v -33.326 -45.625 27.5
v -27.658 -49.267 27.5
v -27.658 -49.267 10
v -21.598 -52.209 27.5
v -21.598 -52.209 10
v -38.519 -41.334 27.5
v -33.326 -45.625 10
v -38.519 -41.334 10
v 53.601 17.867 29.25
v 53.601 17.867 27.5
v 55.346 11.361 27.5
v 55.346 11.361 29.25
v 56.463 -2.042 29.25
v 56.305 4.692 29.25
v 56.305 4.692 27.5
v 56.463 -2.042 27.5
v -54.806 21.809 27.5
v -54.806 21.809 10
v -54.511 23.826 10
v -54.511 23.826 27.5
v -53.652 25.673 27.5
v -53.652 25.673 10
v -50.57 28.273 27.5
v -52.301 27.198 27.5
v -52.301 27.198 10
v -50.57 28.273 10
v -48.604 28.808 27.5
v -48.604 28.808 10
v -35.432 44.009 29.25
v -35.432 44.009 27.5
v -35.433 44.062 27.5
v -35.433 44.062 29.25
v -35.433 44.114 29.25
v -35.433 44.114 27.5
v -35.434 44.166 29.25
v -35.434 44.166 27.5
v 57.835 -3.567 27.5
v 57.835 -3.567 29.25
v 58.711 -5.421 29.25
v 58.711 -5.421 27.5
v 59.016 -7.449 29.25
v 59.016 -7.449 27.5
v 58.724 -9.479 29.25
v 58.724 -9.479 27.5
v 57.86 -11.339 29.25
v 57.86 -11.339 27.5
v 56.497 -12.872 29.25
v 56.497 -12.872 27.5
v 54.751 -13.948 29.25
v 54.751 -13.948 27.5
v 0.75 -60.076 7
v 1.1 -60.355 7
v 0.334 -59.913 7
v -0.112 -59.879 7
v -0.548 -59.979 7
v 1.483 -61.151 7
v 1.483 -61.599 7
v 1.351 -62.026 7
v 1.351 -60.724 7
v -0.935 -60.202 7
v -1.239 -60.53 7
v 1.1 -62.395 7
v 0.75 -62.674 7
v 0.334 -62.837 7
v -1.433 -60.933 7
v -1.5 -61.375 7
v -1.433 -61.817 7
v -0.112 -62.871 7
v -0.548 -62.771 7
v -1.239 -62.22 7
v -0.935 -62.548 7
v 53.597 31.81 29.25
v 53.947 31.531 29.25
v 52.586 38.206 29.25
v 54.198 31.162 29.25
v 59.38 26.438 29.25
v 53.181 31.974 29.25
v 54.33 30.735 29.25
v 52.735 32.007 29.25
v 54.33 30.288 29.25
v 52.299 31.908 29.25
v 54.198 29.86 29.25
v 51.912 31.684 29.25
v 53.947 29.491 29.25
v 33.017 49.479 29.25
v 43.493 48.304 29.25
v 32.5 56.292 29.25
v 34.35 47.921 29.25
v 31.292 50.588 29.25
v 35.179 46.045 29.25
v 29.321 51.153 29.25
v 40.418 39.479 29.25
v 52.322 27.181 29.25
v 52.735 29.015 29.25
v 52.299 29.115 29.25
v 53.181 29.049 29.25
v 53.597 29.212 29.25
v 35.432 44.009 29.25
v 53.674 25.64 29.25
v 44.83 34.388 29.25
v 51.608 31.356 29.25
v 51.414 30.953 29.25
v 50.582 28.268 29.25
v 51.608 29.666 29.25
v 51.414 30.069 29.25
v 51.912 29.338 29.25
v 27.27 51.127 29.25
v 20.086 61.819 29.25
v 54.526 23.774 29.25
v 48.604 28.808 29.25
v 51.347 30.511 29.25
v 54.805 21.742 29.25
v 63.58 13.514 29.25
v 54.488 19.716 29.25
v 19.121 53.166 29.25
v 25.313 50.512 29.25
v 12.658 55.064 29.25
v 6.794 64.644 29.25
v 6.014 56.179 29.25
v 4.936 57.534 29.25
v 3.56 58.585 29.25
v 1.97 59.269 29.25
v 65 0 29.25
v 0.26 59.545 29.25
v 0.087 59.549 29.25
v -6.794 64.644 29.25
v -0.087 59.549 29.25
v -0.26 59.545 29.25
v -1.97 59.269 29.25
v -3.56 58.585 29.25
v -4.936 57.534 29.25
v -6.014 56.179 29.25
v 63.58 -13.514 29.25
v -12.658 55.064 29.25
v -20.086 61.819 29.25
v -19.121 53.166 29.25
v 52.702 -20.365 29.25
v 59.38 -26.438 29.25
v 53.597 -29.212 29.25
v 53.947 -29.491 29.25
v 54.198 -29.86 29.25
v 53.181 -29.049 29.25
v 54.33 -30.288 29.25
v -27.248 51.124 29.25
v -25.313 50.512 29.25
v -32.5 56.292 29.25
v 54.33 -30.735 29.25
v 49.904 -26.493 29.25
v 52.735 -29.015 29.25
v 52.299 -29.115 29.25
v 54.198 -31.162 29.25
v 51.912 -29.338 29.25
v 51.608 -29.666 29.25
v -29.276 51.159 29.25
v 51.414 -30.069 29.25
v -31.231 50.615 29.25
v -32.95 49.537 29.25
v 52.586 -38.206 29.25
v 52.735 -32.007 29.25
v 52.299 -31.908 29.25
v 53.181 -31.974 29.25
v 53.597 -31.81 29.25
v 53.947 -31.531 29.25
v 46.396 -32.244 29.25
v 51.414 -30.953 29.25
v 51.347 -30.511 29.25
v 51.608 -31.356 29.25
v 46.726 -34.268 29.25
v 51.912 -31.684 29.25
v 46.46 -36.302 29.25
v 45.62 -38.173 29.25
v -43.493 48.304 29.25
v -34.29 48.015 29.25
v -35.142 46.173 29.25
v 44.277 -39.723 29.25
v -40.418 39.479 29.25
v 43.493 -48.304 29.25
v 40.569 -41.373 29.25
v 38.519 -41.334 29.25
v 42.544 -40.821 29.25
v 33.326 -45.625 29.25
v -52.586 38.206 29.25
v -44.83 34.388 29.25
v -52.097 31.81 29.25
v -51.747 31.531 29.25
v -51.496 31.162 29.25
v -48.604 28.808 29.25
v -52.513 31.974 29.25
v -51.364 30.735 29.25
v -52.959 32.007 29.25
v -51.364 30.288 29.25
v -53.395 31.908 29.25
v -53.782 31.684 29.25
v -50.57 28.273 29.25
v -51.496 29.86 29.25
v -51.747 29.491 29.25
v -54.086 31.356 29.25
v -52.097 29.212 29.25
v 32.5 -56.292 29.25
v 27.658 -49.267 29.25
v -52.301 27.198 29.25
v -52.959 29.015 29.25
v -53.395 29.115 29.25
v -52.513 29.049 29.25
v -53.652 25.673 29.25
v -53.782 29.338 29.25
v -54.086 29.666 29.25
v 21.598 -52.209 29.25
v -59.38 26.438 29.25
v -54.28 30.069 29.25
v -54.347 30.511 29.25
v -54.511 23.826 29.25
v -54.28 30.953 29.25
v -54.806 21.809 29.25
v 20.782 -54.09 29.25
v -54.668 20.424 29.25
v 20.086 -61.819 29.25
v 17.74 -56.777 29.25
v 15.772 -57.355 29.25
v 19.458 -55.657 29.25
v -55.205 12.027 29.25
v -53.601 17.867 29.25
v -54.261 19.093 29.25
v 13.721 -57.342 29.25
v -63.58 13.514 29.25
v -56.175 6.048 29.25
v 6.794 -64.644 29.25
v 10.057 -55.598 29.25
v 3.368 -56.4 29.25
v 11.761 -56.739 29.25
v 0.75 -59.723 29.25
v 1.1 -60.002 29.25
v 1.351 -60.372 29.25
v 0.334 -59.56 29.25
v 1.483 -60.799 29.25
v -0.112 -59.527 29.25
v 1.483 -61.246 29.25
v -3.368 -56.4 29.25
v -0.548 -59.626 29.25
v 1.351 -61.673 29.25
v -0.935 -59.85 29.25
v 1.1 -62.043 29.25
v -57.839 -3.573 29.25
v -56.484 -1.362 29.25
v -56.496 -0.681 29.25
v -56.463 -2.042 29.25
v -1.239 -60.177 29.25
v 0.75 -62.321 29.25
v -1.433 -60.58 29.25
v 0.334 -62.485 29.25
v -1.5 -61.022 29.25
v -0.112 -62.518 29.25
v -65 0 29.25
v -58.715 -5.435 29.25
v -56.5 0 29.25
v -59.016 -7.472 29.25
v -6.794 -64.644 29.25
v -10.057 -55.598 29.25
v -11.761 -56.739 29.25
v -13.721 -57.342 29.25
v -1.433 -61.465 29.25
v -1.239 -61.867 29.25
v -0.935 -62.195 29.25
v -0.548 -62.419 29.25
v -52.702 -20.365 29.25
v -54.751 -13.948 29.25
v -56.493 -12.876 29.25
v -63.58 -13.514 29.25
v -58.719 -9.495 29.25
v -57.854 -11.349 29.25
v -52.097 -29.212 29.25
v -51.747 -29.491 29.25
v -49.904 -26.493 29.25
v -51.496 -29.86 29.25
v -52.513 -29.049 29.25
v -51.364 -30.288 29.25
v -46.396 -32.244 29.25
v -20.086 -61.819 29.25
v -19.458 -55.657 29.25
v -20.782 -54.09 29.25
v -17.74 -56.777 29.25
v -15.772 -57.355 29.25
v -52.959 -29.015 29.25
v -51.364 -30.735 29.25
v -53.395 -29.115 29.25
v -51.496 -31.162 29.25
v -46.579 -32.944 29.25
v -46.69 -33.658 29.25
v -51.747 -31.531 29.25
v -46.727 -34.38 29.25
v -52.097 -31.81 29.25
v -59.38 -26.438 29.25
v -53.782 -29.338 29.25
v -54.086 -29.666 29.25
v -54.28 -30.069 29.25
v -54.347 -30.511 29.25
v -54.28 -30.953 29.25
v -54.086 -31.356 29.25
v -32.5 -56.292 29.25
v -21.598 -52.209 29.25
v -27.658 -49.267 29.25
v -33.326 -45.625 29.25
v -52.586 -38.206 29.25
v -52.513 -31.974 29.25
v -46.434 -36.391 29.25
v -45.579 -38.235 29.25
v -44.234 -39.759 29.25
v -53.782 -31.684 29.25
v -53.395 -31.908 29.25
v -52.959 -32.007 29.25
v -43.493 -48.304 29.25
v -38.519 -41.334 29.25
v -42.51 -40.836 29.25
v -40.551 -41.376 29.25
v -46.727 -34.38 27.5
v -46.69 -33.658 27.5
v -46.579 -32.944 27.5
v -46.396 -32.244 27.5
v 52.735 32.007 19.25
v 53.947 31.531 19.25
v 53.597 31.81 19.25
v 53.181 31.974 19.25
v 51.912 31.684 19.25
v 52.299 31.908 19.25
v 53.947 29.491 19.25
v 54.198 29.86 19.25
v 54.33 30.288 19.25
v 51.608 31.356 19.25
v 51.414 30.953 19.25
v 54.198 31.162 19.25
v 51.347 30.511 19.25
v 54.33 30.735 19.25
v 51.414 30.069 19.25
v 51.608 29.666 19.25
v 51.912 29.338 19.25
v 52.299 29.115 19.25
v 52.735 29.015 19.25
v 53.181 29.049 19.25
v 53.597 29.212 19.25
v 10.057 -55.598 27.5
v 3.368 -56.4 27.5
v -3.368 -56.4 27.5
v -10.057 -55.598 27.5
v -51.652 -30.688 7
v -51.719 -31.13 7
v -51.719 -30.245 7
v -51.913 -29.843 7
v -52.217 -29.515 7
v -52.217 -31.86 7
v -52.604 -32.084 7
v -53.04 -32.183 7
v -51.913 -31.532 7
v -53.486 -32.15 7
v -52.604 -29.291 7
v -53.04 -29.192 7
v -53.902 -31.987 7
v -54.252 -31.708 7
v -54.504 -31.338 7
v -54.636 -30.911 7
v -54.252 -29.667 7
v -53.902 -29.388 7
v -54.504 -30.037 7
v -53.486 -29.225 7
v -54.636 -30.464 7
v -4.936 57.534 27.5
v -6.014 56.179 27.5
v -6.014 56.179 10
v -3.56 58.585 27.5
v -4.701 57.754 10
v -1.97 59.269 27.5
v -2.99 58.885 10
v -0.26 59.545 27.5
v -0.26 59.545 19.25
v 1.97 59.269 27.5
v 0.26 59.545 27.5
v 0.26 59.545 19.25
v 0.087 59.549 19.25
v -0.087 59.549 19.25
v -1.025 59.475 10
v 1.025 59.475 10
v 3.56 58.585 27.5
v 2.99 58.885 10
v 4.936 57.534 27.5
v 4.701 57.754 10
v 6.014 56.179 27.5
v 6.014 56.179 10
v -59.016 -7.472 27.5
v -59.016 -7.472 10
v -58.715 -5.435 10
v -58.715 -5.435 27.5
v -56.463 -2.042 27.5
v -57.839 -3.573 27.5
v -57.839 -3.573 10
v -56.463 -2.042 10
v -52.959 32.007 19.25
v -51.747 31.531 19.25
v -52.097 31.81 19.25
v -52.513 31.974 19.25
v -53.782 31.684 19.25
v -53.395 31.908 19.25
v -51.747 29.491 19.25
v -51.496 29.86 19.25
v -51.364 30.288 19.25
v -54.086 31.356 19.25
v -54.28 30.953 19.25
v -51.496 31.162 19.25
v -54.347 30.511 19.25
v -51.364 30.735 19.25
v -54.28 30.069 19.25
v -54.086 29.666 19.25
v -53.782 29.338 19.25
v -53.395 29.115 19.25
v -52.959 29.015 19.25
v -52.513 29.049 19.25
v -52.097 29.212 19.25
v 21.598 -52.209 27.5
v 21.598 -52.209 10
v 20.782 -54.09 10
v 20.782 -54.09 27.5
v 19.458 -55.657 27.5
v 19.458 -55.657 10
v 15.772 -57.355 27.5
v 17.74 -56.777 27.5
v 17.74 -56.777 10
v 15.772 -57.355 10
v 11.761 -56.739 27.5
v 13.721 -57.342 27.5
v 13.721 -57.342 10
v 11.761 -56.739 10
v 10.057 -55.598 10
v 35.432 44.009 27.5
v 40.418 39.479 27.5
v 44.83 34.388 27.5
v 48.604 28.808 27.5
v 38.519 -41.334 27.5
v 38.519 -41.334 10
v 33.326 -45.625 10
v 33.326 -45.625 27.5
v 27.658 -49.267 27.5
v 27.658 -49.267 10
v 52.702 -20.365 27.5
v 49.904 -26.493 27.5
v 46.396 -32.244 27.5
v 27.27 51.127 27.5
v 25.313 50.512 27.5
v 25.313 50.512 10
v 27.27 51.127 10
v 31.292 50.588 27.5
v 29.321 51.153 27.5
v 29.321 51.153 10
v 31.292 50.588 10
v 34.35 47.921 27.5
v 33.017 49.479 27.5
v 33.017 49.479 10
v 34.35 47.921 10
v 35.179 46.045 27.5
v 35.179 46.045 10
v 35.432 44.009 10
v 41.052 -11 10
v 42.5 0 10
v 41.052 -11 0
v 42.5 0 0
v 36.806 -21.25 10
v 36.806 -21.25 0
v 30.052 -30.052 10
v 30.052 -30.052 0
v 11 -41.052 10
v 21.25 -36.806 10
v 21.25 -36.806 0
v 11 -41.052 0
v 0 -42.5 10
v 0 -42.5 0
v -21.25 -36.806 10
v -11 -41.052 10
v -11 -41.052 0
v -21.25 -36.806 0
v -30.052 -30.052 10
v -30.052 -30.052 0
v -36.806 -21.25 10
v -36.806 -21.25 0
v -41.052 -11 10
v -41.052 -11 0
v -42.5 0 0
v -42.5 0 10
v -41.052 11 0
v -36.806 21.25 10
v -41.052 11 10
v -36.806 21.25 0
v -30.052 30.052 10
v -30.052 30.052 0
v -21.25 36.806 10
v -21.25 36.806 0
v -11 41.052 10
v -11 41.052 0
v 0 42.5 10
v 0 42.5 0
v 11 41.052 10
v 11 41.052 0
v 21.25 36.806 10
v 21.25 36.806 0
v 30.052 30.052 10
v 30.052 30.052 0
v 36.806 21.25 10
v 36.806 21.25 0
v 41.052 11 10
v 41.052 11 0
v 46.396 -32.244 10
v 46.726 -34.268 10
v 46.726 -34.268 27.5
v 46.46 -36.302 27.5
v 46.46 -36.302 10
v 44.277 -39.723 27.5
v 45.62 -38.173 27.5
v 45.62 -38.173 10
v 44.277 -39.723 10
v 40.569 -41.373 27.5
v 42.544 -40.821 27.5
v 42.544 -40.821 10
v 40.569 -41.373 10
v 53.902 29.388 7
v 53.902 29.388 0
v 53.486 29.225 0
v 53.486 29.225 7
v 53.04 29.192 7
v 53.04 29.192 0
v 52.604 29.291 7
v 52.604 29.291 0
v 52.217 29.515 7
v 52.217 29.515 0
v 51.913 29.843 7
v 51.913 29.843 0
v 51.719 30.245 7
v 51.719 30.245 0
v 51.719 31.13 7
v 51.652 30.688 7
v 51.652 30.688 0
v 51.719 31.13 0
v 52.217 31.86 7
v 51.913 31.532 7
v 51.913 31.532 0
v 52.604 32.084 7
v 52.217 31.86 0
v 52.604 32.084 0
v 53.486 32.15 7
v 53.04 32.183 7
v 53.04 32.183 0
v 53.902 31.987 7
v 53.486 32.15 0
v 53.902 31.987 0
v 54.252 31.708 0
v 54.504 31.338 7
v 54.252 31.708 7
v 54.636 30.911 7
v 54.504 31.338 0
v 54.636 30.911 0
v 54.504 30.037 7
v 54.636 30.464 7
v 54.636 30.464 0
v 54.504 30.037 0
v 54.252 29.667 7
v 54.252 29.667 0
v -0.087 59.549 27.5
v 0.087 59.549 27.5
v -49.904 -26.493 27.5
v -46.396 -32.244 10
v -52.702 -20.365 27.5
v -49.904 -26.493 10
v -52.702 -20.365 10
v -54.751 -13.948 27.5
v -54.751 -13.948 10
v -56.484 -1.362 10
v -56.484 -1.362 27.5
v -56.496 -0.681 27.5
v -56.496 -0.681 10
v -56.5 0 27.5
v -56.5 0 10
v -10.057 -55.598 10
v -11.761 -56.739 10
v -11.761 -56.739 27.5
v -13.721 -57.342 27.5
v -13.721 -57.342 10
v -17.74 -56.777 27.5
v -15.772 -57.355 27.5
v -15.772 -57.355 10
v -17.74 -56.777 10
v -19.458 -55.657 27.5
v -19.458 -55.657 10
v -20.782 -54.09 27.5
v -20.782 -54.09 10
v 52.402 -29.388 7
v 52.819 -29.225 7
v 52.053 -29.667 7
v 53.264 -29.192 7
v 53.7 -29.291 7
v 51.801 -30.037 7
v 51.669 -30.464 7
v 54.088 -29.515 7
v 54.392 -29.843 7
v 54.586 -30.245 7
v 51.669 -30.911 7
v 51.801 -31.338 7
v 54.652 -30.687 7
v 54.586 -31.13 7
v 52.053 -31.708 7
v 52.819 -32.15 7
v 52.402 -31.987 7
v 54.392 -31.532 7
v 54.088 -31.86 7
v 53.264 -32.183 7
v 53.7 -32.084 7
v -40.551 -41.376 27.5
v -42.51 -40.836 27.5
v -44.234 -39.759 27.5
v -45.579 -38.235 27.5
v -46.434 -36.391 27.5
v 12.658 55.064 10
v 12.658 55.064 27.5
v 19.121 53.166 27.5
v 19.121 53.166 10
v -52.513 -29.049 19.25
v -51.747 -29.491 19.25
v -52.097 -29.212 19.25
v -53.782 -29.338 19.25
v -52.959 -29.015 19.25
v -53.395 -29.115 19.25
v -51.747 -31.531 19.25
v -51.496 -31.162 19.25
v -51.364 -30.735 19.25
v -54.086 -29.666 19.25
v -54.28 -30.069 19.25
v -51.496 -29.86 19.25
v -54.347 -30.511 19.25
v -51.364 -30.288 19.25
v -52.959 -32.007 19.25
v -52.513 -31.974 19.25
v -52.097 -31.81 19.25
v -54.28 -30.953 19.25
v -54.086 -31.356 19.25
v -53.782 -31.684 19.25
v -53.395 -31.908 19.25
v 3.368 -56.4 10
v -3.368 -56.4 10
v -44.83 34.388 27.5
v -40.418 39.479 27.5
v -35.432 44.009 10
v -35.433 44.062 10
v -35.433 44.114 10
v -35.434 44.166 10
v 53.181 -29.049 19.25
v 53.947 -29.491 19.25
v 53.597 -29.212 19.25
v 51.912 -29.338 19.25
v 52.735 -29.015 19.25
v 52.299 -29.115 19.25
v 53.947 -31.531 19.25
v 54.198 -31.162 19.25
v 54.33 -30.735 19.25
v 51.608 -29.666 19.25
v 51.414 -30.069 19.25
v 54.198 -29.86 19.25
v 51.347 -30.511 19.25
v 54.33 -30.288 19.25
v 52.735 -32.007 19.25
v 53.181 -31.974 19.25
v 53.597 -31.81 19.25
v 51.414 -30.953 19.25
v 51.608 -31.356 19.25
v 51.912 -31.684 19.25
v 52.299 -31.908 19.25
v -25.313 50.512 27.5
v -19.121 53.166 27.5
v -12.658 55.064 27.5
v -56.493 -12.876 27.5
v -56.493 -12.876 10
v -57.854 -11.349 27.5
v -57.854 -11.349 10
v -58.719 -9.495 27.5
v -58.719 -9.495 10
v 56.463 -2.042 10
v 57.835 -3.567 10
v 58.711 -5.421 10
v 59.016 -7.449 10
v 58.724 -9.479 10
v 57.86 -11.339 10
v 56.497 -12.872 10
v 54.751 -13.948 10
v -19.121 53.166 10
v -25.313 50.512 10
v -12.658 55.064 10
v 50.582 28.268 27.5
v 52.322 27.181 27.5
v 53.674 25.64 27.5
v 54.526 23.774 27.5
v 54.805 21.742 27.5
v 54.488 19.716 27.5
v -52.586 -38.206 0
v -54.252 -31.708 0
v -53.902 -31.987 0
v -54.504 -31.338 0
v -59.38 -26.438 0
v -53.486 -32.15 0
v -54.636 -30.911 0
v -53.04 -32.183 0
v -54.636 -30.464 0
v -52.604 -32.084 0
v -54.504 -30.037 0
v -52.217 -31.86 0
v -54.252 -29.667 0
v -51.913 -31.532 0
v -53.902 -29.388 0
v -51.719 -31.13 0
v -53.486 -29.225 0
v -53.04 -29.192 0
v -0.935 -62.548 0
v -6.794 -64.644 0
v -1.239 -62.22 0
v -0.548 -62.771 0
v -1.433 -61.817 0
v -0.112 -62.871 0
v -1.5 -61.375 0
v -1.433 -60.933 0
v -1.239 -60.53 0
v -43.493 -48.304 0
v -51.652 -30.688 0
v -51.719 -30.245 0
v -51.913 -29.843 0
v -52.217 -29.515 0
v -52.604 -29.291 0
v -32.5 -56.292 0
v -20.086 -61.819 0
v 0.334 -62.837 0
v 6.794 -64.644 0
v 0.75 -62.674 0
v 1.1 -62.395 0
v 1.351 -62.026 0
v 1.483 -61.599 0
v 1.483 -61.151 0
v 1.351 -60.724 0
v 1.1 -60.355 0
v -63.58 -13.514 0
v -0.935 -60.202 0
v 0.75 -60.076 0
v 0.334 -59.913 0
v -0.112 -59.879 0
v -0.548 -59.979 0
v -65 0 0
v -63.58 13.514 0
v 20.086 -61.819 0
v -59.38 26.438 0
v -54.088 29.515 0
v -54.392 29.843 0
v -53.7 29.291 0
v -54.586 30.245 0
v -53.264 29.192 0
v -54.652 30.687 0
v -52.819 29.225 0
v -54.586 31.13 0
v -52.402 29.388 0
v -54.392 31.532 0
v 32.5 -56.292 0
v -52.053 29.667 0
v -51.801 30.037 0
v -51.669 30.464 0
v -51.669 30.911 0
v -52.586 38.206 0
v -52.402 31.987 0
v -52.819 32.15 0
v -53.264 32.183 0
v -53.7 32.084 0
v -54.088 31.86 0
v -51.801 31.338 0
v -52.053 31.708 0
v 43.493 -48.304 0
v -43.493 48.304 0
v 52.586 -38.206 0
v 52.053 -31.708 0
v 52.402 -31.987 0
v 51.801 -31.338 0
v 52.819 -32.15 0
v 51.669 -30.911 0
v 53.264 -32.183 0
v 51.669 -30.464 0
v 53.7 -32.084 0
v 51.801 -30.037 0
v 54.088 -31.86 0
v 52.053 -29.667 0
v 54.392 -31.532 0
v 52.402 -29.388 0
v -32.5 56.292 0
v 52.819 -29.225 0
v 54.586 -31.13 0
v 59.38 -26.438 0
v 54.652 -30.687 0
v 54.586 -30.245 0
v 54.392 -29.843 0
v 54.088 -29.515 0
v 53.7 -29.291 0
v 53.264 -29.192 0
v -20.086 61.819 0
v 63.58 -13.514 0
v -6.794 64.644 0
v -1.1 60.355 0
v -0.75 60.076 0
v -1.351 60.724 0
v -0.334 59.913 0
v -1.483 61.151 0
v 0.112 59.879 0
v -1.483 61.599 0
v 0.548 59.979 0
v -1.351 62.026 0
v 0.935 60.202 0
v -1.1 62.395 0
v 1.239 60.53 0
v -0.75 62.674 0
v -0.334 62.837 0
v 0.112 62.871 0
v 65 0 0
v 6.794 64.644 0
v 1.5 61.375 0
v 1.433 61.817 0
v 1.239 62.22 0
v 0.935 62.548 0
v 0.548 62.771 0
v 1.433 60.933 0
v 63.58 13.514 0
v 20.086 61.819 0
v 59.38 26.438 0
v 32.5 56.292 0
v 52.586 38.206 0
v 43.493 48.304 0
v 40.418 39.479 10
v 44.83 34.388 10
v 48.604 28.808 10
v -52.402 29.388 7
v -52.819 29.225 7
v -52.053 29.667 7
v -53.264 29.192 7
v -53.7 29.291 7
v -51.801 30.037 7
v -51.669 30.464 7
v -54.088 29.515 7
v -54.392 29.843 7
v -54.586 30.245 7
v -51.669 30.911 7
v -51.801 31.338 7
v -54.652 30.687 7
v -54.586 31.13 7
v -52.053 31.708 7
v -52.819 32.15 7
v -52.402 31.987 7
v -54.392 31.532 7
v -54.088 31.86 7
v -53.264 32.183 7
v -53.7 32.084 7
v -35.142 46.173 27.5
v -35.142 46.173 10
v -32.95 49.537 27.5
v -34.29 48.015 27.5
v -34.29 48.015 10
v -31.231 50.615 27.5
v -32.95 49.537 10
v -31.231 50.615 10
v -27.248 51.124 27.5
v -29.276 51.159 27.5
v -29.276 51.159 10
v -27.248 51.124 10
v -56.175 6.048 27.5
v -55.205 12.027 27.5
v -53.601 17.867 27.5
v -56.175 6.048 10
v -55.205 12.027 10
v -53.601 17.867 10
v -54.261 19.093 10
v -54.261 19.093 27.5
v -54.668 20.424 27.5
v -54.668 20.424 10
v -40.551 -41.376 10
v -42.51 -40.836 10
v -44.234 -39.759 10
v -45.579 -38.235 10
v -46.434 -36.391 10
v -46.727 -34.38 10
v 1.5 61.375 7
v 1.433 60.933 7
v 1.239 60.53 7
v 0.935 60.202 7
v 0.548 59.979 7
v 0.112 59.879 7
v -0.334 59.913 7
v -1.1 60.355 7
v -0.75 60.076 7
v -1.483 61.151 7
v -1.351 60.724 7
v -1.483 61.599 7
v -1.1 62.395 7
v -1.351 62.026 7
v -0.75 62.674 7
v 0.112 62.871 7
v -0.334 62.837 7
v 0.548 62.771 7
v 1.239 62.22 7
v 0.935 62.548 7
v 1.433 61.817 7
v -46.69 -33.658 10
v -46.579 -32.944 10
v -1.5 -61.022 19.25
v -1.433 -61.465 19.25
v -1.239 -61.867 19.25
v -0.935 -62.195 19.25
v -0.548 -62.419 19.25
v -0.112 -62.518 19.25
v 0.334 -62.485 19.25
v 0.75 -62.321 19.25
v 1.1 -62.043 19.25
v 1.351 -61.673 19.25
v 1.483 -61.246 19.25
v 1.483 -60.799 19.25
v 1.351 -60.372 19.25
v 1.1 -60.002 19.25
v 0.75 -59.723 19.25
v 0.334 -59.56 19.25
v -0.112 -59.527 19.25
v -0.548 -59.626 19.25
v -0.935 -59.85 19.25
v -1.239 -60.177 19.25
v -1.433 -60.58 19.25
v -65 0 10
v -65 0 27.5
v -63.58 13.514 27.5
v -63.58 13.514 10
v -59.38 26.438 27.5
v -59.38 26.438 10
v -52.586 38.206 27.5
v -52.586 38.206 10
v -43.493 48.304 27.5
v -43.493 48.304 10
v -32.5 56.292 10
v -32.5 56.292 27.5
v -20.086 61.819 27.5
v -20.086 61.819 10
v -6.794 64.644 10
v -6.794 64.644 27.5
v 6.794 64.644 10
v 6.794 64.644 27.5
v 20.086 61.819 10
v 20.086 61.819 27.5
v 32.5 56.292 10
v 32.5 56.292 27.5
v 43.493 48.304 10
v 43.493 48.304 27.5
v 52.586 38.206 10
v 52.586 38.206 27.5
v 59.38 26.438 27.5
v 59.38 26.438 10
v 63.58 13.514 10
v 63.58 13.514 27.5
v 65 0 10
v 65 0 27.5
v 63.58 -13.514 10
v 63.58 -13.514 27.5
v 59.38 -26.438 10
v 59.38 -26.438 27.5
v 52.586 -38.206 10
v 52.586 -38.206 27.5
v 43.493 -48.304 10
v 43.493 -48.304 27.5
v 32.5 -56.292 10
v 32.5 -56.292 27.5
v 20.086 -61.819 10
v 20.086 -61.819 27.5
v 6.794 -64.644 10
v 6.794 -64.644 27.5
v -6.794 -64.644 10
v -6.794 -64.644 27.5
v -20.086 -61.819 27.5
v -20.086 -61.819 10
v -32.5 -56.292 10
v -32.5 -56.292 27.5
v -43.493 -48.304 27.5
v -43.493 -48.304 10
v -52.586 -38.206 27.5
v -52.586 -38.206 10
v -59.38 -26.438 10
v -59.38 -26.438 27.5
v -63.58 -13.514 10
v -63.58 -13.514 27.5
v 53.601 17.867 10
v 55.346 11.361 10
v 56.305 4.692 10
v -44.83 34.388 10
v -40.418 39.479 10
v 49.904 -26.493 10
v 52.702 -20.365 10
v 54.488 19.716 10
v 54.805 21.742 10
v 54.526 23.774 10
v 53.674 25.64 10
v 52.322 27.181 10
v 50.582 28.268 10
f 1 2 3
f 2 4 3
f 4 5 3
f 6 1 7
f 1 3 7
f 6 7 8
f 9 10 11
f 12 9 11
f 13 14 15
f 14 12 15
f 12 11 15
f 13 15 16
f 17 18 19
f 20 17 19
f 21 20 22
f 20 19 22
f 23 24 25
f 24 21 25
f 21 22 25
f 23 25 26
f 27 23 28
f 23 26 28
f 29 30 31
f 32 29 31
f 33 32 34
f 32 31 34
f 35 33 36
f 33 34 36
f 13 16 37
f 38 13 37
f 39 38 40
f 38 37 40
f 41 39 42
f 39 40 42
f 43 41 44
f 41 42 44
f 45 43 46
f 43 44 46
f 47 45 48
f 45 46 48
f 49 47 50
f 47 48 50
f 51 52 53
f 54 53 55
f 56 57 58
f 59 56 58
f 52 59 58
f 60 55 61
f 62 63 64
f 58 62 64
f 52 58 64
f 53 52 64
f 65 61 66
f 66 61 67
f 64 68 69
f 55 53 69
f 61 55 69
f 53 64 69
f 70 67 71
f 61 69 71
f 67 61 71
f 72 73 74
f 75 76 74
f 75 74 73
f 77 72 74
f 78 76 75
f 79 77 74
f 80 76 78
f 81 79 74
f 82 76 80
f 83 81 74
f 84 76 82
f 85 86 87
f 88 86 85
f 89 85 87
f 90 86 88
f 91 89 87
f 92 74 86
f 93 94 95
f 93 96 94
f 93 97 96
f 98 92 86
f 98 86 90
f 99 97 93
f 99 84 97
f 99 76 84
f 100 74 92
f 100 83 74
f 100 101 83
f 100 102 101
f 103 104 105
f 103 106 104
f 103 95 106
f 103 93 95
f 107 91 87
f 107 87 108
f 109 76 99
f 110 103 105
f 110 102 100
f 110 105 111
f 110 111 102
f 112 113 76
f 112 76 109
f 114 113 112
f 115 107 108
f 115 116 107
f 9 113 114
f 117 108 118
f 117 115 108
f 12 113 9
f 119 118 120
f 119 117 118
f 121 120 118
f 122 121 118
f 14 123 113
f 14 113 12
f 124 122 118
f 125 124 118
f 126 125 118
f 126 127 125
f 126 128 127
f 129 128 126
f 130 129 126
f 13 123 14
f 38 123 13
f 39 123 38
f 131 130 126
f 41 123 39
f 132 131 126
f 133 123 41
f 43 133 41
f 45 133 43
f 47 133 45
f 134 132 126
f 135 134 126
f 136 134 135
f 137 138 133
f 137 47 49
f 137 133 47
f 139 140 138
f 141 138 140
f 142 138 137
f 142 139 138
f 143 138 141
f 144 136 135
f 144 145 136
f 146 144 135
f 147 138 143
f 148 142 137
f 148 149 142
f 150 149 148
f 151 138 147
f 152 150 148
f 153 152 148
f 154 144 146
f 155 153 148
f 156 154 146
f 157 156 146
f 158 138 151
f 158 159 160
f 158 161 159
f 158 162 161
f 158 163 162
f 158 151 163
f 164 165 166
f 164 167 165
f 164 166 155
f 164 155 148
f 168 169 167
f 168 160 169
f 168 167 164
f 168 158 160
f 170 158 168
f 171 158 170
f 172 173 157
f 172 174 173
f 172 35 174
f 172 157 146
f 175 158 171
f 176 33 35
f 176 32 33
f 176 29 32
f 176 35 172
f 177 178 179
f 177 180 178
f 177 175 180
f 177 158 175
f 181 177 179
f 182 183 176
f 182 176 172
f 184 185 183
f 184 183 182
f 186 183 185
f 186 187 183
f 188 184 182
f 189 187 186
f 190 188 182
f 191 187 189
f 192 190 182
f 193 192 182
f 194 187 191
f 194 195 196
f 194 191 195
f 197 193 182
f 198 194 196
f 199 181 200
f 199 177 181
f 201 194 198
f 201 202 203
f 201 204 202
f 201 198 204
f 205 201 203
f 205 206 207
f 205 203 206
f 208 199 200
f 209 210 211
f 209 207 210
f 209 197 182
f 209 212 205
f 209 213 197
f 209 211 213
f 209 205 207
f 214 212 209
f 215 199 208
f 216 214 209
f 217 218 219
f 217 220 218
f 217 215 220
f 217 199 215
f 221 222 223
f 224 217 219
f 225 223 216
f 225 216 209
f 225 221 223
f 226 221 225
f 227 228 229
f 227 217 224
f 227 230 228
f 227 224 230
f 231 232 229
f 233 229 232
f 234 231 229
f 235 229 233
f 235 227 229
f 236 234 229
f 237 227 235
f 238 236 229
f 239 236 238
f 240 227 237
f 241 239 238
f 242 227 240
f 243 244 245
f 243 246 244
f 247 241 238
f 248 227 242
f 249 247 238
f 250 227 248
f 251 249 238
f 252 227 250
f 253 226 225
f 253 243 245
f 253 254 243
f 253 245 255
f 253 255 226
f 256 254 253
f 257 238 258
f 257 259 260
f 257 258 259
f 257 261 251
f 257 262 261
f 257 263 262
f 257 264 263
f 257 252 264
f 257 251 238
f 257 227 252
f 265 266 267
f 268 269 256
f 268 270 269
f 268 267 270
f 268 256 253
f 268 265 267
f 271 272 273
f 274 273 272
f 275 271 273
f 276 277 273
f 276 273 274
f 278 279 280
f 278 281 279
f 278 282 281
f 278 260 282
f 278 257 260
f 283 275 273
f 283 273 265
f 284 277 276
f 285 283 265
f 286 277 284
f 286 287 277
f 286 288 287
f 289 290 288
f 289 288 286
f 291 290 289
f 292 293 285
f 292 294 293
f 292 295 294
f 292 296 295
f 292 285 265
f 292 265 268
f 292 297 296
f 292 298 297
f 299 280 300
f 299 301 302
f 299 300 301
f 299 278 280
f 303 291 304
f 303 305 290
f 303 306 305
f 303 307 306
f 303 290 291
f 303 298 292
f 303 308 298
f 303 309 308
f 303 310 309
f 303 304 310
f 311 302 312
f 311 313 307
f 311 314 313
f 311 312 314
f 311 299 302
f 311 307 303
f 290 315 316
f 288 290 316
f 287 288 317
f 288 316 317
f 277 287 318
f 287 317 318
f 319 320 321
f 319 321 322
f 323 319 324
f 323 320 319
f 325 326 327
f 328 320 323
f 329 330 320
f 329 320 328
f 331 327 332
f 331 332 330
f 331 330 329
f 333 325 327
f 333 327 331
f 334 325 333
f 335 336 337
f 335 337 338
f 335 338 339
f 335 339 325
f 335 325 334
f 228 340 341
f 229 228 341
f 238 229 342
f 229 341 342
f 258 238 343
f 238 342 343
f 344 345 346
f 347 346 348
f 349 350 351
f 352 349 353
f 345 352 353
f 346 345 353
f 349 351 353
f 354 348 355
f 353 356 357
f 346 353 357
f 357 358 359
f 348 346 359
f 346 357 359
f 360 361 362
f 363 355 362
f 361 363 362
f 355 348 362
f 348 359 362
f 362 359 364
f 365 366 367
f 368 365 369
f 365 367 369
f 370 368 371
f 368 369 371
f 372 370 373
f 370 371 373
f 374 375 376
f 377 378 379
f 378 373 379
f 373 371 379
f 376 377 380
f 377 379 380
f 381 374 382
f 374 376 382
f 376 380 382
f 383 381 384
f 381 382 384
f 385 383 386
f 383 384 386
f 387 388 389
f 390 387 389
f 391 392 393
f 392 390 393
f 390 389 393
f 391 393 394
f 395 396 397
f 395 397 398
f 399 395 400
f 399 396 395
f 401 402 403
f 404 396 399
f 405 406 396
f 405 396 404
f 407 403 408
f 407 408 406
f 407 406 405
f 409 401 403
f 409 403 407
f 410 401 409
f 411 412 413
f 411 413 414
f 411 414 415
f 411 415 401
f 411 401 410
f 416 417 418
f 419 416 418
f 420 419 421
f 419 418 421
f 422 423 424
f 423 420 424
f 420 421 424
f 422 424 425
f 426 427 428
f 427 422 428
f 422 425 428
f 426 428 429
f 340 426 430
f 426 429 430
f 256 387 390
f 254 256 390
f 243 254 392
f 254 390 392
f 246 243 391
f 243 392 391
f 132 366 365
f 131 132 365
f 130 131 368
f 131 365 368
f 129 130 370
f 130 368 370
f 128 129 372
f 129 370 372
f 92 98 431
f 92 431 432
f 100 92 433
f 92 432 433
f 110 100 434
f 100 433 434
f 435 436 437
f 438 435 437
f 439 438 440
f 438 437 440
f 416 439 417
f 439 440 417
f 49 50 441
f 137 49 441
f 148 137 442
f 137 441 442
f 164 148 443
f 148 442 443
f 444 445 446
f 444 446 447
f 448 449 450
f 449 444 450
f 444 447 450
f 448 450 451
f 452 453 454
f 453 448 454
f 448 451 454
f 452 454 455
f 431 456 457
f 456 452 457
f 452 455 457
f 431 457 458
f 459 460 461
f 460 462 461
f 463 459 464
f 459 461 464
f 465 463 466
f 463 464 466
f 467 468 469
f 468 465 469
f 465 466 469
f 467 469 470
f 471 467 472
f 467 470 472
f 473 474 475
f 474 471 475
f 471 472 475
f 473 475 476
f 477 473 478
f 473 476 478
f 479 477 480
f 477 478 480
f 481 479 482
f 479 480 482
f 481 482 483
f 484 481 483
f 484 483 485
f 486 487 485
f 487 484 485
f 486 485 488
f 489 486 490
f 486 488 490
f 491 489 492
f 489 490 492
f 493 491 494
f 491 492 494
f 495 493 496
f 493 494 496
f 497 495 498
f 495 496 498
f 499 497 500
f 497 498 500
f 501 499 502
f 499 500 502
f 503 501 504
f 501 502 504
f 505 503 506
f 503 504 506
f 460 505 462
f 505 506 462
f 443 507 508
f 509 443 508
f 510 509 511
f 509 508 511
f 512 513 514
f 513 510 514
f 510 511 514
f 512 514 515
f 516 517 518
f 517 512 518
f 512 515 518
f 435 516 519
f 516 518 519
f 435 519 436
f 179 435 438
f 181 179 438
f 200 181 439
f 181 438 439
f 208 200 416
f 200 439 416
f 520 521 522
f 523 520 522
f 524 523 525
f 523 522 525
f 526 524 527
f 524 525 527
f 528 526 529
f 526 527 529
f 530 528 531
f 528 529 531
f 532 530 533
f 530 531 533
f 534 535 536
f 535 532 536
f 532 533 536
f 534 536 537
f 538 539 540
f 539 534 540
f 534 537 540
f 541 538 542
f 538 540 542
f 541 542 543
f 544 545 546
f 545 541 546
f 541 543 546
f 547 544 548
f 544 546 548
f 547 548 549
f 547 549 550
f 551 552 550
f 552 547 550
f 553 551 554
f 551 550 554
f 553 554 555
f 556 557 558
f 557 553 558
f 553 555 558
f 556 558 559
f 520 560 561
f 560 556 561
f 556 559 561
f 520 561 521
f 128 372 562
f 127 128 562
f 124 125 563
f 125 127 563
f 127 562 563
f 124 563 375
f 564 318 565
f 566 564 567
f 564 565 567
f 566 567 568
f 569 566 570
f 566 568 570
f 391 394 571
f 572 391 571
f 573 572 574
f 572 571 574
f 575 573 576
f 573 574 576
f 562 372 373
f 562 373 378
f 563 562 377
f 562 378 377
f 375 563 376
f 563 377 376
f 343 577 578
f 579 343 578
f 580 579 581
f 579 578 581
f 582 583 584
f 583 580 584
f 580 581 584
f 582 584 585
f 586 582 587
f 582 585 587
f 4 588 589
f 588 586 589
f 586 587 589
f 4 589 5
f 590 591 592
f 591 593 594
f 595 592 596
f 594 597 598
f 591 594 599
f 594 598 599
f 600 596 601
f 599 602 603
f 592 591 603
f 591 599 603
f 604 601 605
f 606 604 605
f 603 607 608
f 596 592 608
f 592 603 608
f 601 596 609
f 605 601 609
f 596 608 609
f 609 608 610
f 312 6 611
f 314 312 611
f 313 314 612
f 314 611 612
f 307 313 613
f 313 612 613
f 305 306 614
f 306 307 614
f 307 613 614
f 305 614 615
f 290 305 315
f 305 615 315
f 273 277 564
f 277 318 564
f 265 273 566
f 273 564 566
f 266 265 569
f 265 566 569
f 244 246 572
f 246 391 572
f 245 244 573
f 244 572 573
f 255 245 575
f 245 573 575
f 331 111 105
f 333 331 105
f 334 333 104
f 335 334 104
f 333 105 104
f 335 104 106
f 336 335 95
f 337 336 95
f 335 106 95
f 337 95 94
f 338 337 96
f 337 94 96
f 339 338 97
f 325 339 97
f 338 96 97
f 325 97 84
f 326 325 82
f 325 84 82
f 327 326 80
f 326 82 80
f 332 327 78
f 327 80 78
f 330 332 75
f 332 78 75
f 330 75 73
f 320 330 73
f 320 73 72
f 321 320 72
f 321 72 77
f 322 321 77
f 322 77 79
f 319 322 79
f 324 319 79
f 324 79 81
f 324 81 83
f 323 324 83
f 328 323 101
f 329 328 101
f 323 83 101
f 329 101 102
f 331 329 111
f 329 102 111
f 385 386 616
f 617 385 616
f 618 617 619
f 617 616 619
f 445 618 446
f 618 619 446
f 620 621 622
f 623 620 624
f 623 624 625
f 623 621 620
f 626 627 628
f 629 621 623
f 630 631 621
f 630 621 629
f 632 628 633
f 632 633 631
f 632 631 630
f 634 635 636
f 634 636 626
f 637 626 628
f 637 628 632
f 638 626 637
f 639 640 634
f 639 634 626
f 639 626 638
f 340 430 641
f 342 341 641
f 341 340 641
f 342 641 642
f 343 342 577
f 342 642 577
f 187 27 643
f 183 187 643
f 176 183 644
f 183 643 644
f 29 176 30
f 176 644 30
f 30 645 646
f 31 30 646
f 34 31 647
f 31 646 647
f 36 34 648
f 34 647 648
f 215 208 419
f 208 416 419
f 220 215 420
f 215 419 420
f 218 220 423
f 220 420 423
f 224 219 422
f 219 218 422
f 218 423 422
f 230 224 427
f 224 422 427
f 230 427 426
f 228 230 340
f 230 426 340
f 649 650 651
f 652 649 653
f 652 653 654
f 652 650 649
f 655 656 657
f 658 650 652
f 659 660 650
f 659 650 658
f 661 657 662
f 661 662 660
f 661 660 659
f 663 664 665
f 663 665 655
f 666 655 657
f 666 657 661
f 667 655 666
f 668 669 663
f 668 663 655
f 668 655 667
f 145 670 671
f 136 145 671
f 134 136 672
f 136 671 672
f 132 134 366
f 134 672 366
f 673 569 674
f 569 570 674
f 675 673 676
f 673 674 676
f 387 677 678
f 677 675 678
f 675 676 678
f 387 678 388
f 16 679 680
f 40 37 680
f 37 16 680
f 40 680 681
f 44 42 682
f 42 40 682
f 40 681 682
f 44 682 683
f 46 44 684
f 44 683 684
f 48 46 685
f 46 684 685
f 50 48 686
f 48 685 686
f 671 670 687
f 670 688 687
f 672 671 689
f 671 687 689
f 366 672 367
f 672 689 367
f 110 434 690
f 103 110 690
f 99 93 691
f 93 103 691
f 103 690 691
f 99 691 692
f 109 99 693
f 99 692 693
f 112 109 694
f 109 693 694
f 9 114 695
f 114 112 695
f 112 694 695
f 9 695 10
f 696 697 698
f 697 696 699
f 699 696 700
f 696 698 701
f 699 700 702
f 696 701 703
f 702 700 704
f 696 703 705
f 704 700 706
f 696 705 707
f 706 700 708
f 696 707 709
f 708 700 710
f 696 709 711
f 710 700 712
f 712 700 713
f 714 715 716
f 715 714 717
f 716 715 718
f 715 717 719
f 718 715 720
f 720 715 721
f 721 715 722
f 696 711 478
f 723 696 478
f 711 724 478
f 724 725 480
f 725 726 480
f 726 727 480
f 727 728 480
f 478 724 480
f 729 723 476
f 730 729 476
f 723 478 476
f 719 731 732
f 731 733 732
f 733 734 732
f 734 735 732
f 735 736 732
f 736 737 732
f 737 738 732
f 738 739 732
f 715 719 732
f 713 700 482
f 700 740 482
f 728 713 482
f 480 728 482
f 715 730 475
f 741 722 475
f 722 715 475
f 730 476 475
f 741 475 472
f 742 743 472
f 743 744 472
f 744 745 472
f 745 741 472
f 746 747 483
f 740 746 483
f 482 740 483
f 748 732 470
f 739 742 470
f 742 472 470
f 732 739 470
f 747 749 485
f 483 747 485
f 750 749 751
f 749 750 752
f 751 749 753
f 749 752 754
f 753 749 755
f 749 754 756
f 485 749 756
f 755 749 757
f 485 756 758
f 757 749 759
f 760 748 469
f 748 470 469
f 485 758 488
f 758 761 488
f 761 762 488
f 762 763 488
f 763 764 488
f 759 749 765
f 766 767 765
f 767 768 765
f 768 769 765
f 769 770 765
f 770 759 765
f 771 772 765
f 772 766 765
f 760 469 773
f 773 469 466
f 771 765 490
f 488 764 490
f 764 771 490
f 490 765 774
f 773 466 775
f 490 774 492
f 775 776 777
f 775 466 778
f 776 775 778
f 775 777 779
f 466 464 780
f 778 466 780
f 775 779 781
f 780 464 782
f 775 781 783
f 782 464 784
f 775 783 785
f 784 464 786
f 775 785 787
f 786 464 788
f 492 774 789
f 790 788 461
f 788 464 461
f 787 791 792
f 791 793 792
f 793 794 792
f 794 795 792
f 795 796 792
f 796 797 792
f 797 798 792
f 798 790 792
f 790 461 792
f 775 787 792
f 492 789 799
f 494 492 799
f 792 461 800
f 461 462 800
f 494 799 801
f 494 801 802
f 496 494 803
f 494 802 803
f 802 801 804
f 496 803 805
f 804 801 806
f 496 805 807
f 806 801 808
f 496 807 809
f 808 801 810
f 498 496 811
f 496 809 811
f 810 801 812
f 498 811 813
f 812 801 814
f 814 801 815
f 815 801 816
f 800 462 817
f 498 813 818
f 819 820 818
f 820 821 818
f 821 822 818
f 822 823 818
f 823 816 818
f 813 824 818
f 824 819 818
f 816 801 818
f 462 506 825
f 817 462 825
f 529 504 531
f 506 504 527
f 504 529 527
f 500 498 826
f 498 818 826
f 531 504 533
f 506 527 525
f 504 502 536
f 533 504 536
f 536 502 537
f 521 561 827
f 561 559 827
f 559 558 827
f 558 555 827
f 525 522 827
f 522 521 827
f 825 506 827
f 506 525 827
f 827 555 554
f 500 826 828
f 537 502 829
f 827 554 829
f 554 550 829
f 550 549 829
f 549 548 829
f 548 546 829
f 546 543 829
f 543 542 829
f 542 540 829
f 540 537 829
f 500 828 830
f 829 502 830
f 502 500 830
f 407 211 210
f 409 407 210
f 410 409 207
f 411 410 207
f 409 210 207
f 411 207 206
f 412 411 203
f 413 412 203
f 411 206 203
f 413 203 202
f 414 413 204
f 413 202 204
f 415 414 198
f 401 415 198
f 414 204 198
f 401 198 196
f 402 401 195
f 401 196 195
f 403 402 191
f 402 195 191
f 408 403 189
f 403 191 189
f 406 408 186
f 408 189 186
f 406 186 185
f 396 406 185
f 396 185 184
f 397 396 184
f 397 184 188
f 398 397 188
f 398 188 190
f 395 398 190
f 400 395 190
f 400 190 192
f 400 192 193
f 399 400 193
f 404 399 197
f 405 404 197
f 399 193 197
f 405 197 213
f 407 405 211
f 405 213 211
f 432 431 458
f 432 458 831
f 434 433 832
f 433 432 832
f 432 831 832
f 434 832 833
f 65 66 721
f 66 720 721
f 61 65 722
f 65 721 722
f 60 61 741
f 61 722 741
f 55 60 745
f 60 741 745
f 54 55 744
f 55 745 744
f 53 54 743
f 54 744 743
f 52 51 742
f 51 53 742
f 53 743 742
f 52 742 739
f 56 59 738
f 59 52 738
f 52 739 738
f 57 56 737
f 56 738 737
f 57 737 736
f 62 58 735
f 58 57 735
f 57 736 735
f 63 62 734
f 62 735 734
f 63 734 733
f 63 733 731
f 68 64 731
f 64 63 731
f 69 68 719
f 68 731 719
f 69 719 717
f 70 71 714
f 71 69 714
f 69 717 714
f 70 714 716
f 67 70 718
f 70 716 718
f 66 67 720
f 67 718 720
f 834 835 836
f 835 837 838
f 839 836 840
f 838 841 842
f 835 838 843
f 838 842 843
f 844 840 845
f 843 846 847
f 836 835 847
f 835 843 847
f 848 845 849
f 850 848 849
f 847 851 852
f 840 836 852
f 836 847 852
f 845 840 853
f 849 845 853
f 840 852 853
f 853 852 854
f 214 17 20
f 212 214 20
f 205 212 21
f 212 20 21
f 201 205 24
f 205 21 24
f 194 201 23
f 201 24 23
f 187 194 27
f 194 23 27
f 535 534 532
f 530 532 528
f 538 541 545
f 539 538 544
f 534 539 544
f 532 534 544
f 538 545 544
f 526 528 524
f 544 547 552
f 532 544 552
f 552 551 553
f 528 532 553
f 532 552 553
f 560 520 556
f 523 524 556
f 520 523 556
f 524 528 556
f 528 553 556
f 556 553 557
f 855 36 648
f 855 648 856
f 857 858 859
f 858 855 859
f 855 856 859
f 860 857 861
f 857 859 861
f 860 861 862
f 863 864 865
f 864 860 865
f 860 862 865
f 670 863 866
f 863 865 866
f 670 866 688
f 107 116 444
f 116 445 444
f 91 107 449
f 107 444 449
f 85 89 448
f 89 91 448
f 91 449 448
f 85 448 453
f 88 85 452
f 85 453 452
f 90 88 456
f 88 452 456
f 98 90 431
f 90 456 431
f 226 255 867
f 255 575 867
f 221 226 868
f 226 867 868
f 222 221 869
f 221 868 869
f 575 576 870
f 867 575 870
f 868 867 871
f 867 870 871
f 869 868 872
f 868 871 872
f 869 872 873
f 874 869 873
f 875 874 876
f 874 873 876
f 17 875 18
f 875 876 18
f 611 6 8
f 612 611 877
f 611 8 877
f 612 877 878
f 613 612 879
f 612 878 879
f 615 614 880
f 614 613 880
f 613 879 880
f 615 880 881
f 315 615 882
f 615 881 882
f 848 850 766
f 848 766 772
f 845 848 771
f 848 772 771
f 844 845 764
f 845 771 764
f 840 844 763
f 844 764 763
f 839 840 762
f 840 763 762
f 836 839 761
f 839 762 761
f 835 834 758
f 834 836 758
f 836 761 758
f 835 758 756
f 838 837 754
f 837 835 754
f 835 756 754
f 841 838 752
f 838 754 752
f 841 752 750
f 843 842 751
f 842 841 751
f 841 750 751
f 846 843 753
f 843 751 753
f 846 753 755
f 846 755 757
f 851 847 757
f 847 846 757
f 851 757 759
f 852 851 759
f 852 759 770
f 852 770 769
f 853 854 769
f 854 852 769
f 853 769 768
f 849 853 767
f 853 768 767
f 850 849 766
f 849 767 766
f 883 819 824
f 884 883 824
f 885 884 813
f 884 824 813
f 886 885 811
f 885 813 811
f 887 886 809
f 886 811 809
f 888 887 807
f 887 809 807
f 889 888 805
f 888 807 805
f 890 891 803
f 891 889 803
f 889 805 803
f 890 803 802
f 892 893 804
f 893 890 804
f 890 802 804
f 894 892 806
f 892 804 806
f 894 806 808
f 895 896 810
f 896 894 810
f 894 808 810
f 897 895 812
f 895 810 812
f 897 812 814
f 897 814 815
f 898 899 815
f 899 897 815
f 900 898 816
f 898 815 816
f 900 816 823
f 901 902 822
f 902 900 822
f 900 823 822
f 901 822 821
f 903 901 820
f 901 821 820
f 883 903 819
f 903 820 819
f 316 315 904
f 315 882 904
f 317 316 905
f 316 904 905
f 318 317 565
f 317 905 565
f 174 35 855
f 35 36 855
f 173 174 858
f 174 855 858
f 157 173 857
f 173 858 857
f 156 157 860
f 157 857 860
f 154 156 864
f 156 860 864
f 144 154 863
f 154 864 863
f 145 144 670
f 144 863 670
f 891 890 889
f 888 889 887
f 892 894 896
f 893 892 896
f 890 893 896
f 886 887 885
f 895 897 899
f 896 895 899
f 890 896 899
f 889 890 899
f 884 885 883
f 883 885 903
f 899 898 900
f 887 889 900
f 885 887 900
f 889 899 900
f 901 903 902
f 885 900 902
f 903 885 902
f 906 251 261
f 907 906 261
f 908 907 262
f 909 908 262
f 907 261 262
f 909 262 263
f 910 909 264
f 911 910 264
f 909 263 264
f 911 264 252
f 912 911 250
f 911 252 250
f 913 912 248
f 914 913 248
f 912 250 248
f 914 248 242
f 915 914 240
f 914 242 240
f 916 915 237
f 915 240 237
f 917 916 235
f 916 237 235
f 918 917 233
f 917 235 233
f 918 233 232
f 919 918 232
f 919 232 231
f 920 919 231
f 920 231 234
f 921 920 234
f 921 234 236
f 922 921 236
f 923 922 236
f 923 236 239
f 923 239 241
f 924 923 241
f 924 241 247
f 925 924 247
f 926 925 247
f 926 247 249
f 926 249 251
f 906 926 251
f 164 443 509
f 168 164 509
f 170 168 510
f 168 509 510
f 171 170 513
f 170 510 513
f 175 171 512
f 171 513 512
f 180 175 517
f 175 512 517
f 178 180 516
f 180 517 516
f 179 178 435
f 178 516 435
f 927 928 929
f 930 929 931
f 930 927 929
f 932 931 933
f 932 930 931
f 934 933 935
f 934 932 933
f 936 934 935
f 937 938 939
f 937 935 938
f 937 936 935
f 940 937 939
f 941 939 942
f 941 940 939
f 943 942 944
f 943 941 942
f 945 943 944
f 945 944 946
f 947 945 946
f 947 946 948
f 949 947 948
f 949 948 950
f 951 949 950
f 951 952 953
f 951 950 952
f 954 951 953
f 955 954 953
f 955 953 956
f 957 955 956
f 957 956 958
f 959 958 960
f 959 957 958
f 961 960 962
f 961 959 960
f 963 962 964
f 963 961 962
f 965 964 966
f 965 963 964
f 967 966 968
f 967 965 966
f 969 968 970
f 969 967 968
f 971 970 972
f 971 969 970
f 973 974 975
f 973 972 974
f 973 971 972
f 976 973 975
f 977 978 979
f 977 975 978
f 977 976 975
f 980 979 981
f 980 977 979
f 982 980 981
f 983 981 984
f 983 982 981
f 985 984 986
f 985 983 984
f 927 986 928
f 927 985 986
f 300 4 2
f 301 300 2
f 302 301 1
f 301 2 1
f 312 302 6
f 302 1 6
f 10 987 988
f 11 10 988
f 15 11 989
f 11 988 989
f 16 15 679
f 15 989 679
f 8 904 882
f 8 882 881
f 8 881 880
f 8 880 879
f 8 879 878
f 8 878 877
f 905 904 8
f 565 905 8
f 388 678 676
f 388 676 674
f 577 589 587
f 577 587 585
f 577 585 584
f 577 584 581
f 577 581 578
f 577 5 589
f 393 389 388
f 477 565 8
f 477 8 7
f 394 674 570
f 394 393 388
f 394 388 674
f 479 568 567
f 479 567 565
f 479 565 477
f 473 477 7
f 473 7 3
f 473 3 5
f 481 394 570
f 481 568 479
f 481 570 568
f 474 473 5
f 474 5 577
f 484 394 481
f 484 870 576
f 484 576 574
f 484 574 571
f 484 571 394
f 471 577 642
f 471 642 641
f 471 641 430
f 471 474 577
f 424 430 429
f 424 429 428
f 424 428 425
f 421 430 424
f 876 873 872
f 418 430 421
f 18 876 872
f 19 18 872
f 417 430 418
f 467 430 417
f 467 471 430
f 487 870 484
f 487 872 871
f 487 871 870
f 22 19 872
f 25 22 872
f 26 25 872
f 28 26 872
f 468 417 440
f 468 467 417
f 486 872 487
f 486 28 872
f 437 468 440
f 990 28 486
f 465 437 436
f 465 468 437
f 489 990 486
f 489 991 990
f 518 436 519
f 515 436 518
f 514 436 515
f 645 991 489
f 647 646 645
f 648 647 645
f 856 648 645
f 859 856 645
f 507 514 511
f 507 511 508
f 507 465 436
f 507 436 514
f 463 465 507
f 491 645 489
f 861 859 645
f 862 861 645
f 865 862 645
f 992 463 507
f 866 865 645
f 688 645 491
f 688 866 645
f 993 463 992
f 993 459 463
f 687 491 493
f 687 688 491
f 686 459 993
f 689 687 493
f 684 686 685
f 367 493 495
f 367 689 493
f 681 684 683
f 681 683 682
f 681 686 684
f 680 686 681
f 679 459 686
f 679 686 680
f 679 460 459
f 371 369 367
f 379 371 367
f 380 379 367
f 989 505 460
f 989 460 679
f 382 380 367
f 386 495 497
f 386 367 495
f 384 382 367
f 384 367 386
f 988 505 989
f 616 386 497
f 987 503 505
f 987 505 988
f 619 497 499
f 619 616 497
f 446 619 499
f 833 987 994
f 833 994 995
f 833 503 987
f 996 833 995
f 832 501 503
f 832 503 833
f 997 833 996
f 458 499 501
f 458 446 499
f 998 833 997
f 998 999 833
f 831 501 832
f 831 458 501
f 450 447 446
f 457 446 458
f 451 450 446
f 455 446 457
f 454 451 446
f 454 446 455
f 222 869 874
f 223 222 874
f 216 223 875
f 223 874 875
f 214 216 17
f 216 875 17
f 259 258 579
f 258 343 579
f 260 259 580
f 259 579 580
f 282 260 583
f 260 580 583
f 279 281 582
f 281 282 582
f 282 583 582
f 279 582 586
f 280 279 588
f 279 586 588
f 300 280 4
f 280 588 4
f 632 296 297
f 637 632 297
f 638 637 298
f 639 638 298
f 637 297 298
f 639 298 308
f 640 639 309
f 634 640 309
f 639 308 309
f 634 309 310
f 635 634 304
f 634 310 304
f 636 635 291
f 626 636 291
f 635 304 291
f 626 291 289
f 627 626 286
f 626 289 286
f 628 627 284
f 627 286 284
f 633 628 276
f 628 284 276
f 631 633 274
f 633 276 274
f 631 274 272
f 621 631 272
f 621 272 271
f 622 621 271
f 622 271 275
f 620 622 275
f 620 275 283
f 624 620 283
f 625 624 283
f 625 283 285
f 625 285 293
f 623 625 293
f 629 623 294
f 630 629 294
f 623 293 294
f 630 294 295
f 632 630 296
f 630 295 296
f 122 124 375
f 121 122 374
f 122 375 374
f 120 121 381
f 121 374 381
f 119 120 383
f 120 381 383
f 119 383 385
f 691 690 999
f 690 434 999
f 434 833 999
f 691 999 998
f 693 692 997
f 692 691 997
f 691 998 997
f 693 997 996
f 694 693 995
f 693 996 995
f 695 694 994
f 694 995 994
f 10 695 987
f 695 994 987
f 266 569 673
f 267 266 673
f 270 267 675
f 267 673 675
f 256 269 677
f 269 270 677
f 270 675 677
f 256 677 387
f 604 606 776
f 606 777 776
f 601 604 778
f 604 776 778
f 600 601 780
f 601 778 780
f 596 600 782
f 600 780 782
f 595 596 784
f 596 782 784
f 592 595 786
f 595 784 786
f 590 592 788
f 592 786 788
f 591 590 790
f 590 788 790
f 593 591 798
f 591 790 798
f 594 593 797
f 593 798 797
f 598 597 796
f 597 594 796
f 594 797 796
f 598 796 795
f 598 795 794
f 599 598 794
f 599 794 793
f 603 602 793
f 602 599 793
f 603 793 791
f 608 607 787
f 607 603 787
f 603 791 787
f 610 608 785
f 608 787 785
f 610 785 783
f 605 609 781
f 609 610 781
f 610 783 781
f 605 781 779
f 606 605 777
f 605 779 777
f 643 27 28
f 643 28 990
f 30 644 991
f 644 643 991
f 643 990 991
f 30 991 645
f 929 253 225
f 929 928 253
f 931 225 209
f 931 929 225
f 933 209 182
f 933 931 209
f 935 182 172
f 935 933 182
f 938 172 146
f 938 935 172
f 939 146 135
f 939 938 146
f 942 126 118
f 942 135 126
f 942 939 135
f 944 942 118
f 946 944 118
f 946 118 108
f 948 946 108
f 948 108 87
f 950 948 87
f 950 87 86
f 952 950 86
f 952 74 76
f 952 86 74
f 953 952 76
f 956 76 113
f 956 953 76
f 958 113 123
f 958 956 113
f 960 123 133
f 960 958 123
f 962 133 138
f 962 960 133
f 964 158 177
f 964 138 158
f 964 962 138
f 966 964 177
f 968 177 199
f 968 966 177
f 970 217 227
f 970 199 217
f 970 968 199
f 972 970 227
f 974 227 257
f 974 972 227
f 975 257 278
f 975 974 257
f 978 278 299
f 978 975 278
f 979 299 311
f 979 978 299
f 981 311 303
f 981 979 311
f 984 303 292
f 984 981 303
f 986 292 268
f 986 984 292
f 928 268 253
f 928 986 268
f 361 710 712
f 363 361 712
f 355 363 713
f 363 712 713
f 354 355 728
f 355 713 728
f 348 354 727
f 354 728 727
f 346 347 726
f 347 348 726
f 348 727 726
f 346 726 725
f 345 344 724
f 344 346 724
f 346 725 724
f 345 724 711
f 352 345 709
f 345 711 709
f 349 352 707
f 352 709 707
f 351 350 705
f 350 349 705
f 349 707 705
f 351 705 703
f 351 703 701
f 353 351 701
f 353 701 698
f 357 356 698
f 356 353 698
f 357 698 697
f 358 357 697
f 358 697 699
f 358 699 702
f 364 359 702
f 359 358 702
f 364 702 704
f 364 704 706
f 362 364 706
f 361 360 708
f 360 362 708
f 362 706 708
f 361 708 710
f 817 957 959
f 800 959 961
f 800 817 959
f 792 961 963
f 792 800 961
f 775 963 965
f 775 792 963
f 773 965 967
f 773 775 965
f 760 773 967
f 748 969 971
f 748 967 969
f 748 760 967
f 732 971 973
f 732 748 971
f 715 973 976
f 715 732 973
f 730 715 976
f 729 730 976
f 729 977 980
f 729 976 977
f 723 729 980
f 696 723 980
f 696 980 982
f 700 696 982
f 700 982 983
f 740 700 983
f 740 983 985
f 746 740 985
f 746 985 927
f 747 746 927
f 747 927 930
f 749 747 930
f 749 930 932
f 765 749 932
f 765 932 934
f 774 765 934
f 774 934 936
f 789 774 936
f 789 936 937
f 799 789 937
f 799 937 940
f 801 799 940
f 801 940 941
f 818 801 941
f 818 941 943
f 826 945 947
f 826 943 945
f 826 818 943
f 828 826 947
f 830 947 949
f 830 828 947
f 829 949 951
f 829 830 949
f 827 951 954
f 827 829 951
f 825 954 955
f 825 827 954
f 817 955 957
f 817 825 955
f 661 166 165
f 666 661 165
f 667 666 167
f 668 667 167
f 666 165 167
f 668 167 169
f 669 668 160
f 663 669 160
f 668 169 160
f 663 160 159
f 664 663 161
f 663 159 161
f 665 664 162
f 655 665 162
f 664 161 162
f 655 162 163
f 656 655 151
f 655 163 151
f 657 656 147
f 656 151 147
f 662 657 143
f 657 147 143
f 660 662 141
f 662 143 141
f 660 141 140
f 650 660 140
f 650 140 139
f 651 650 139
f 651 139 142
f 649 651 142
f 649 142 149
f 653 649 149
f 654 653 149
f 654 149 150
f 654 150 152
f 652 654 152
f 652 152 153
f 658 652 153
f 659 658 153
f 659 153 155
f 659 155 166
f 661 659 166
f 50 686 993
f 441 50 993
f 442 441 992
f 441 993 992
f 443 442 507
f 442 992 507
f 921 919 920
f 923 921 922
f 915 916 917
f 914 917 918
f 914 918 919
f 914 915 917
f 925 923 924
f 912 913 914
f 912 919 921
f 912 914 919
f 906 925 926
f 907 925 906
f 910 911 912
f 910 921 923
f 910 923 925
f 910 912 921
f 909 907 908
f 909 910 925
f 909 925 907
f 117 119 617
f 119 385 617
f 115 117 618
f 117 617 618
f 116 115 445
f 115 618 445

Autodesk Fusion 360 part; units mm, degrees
sketch "Sketch1" plane through (0, 0, 0) normal (0, 0, 1) x (1, 0, 0)
  circle A0 centre (0, 0) radius 65
  circle A1 centre (0, 0) radius 61.375 construction
  circle A2 centre (0, 61.375) radius 1.5
  circle A3 centre (0, 0) radius 42.5
  dimension "d1" = 130
  dimension "d2" = 122.75
  dimension "d3" = 3
  dimension "LargeBearingDia" = 85
extrude "Extrude1" add sketch "Sketch1" along normal blind 10 contours A0 | A2
extrude "Extrude2" cut sketch "Sketch1" along normal blind 7 contours A2
pattern_circular "C-Pattern1" count 6 over 360 about axis through (0, 0, 1.75) along (0, 0, 1) of "Extrude2"
sketch "Sketch2" plane through (0, 0, 10) normal (0, 0, 1) x (-1, 0, 0)
  circle A0 centre (0, 0) radius 42.5
  circle A1 centre (0, 0) radius 65
  circle A2 centre (0, 0) radius 52.5 construction
  circle A3 centre (0, -52.5) radius 7.05
  circle A4 centre (28.3836, -44.1658) radius 7.05
  circle A5 centre (47.7557, -21.8093) radius 7.05
  circle A6 centre (51.9656, 7.4715) radius 7.05
  circle A7 centre (39.6769, 34.3802) radius 7.05
  circle A8 centre (14.791, 50.3734) radius 7.05
  circle A9 centre (-14.791, 50.3734) radius 7.05
  circle A10 centre (-39.6769, 34.3802) radius 7.05
  circle A11 centre (-51.9656, 7.4715) radius 7.05
  circle A12 centre (-47.7557, -21.8093) radius 7.05
  circle A13 centre (-28.3836, -44.1658) radius 7.05
  circle A14 centre (0, 0) radius 56.5
  dimension "d11" = 105
  dimension "d12" = 14.1
  dimension "d14" = 360
  dimension "d15" = 113
extrude "Extrude3" add sketch "Sketch2" along normal blind 17.5 contours A1
extrude "Extrude4" add 1 faces at (57.7924, -22.5756, 27.5) along direction (0, 0, 1) blind 1.75
sketch "Sketch3" plane through (0, 0, 29.25) normal (0, 0, 1) x (-1, 0, 0)
  arc A0 (53.6005, -17.8672) -> (56.4631, 2.0424) centre (0, 0) ccw
  arc A1 (48.604, -28.8081) -> (53.6005, -17.8672) centre (47.7557, -21.8093) ccw
  arc A2 (35.4319, -44.0094) -> (48.604, -28.8081) centre (0, 0) ccw
  arc A3 (25.3134, -50.5122) -> (35.4319, -44.0094) centre (28.3836, -44.1658) ccw
  arc A4 (6.0139, -56.179) -> (25.3134, -50.5122) centre (0, 0) ccw
  arc A5 (-6.0139, -56.179) -> (6.0139, -56.179) centre (0, -52.5) ccw
  arc A6 (-25.3134, -50.5122) -> (-6.0139, -56.179) centre (0, 0) ccw
  arc A7 (-35.4319, -44.0094) -> (-25.3134, -50.5122) centre (-28.3836, -44.1658) ccw
  arc A8 (-48.604, -28.8081) -> (-35.4319, -44.0094) centre (0, 0) ccw
  arc A9 (-53.6005, -17.8672) -> (-48.604, -28.8081) centre (-47.7557, -21.8093) ccw
  arc A10 (-56.4631, 2.0424) -> (-53.6005, -17.8672) centre (0, 0) ccw
  arc A11 (-54.7513, 13.9478) -> (-56.4631, 2.0424) centre (-51.9656, 7.4715) ccw
  arc A12 (-46.3956, 32.2444) -> (-54.7513, 13.9478) centre (0, 0) ccw
  arc A13 (-38.519, 41.3345) -> (-46.3956, 32.2444) centre (-39.6769, 34.3802) ccw
  arc A14 (-21.5978, 52.2091) -> (-38.519, 41.3345) centre (0, 0) ccw
  arc A15 (-10.0571, 55.5977) -> (-21.5978, 52.2091) centre (-14.791, 50.3734) ccw
  arc A16 (10.0571, 55.5977) -> (-10.0571, 55.5977) centre (0, 0) ccw
  arc A17 (21.5978, 52.2091) -> (10.0571, 55.5977) centre (14.791, 50.3734) ccw
  arc A18 (38.519, 41.3345) -> (21.5978, 52.2091) centre (0, 0) ccw
  arc A19 (46.3956, 32.2444) -> (38.519, 41.3345) centre (39.6769, 34.3802) ccw
  arc A20 (54.7513, 13.9478) -> (46.3956, 32.2444) centre (0, 0) ccw
  arc A21 (56.4631, 2.0424) -> (54.7513, 13.9478) centre (51.9656, 7.4715) ccw
  circle A22 centre (0, 0) radius 65
  circle A23 centre (0, 0) radius 61.0224 construction
  circle A24 centre (0, -61.0224) radius 1.5
  circle A25 centre (52.847, -30.5112) radius 1.5
  circle A26 centre (52.847, 30.5112) radius 1.5
  circle A27 centre (0, 61.0224) radius 1.5
  circle A28 centre (-52.847, 30.5112) radius 1.5
  circle A29 centre (-52.847, -30.5112) radius 1.5
  dimension "d20" = 3
  dimension "d22" = 360
  dimension "d25" = 122.0449
extrude "Extrude5" cut sketch "Sketch3" against normal blind 10 contours A5 A24 | A25 | A26 | A27 | A28 | A29 picked at (-0.1447, -59.5399)
equation "d3 = ScrewDia_3mm"
equation "d20 = ScrewDia_3mm"
equation "ScrewDia_3mm = 3 mm"
